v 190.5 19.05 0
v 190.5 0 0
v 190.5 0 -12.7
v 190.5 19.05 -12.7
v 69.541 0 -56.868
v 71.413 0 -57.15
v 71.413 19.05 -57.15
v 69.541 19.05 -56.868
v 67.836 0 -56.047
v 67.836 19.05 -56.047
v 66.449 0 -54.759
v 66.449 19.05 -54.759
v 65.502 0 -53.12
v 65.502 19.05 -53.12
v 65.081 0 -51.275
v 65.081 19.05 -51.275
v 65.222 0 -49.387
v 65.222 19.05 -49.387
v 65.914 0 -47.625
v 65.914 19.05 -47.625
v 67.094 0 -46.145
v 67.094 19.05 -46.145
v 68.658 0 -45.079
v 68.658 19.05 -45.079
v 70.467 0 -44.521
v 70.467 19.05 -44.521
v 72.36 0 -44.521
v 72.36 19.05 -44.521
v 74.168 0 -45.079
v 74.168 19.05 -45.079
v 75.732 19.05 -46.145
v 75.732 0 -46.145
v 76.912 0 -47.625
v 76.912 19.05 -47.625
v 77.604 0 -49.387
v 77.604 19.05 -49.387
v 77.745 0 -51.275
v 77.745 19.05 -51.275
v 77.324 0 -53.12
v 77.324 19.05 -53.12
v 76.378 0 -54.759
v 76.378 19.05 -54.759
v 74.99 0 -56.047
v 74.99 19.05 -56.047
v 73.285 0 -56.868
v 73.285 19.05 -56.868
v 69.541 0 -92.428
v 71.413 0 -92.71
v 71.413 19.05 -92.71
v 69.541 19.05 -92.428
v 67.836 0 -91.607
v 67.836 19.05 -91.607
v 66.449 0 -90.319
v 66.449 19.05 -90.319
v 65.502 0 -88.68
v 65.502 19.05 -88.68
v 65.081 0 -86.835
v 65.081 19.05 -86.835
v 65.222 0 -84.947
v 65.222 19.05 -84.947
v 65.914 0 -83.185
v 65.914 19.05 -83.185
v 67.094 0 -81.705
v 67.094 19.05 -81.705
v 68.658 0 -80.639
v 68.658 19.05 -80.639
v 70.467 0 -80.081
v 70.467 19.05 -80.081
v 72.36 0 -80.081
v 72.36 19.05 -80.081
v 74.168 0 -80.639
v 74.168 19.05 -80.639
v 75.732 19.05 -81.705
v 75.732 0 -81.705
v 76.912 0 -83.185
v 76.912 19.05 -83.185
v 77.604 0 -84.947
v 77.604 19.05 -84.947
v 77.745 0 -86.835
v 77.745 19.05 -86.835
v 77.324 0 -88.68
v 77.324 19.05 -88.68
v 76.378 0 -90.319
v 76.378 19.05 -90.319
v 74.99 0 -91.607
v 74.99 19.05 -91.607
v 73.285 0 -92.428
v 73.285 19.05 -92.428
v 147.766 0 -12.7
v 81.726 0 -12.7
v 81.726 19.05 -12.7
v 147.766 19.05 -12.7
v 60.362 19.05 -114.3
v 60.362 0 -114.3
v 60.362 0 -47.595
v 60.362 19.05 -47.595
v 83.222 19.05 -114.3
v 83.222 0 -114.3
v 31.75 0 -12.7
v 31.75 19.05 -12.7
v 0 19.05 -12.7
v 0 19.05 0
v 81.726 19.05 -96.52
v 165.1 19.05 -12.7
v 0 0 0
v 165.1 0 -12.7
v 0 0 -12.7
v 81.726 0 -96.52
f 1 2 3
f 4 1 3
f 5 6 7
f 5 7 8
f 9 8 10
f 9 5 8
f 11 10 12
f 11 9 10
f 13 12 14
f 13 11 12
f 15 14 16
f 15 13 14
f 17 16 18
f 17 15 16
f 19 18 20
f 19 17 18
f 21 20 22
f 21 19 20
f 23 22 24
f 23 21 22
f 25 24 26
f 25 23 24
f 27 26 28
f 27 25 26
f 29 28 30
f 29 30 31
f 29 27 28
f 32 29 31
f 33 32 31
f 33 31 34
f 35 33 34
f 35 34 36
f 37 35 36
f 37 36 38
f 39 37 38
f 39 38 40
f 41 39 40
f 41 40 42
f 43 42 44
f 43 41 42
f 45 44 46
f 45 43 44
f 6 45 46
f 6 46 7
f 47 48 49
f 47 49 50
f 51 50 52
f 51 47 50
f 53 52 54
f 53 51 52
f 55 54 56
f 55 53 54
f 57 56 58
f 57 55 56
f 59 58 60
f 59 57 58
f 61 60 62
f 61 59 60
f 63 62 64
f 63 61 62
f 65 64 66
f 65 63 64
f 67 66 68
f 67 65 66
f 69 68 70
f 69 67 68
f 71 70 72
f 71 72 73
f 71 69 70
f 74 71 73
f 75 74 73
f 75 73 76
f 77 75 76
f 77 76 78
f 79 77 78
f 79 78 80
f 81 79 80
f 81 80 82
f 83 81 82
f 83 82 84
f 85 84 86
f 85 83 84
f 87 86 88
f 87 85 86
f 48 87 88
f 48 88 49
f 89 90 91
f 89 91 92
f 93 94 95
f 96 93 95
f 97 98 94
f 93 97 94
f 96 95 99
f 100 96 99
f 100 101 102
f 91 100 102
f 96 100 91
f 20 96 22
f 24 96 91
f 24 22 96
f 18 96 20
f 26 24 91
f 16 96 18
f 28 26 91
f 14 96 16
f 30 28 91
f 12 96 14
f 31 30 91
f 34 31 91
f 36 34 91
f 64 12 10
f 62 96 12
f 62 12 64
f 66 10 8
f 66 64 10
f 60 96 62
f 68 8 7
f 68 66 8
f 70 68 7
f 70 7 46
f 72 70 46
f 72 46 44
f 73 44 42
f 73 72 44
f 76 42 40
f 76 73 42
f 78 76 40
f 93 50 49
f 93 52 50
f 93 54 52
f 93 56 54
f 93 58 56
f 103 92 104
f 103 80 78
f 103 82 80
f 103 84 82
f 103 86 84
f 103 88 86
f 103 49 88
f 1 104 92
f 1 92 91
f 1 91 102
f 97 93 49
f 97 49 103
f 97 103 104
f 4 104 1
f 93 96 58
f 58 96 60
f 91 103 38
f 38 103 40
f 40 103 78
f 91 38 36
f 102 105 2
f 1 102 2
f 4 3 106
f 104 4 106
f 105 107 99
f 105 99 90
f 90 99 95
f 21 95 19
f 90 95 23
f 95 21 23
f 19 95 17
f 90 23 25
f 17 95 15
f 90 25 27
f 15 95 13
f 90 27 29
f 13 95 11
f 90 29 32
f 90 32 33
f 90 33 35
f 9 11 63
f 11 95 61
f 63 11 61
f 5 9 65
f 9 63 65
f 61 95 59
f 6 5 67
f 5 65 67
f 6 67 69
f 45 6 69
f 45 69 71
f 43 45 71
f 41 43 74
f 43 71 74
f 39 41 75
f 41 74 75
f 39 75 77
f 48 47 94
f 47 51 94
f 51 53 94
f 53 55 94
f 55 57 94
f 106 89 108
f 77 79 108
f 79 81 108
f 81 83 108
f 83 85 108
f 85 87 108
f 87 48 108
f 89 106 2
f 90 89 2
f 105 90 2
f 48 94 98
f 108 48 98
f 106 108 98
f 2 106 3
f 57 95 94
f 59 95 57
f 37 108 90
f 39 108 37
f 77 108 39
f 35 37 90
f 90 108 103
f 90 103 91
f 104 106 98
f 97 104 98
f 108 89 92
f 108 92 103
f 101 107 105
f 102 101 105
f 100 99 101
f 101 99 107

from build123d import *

# Parameters (mm, degrees)
SKETCH1_R           = 6.35
BOSS_EXTRUDE1_DEPTH = 19.05


with BuildPart() as part:
    # Sketch1 → Boss-Extrude1 (new body)
    with BuildSketch(Plane(origin=(0, 0, 0), x_dir=(1, 0, 0), z_dir=(0, 1, 0))):
        Polygon((0, 0), (190.5, 0), (190.5, 12.7), (165.1, 12.7), (83.222475072, 114.3), (60.362475072, 114.3), (60.362475072, 47.594615045), (31.75, 12.7), (0, 12.7), align=None)
        with Locations(Location((71.413185557, 86.36, 0), (0, 0, 90))):
            Circle(SKETCH1_R, mode=Mode.SUBTRACT)
        with Locations(Location((71.413185557, 50.8, 0), (0, 0, 90))):
            Circle(SKETCH1_R, mode=Mode.SUBTRACT)
        Polygon((81.72578072, 96.52), (81.72578072, 12.7), (147.76578072, 12.7), align=None, mode=Mode.SUBTRACT)
    extrude(amount=BOSS_EXTRUDE1_DEPTH)


solid = part.part
